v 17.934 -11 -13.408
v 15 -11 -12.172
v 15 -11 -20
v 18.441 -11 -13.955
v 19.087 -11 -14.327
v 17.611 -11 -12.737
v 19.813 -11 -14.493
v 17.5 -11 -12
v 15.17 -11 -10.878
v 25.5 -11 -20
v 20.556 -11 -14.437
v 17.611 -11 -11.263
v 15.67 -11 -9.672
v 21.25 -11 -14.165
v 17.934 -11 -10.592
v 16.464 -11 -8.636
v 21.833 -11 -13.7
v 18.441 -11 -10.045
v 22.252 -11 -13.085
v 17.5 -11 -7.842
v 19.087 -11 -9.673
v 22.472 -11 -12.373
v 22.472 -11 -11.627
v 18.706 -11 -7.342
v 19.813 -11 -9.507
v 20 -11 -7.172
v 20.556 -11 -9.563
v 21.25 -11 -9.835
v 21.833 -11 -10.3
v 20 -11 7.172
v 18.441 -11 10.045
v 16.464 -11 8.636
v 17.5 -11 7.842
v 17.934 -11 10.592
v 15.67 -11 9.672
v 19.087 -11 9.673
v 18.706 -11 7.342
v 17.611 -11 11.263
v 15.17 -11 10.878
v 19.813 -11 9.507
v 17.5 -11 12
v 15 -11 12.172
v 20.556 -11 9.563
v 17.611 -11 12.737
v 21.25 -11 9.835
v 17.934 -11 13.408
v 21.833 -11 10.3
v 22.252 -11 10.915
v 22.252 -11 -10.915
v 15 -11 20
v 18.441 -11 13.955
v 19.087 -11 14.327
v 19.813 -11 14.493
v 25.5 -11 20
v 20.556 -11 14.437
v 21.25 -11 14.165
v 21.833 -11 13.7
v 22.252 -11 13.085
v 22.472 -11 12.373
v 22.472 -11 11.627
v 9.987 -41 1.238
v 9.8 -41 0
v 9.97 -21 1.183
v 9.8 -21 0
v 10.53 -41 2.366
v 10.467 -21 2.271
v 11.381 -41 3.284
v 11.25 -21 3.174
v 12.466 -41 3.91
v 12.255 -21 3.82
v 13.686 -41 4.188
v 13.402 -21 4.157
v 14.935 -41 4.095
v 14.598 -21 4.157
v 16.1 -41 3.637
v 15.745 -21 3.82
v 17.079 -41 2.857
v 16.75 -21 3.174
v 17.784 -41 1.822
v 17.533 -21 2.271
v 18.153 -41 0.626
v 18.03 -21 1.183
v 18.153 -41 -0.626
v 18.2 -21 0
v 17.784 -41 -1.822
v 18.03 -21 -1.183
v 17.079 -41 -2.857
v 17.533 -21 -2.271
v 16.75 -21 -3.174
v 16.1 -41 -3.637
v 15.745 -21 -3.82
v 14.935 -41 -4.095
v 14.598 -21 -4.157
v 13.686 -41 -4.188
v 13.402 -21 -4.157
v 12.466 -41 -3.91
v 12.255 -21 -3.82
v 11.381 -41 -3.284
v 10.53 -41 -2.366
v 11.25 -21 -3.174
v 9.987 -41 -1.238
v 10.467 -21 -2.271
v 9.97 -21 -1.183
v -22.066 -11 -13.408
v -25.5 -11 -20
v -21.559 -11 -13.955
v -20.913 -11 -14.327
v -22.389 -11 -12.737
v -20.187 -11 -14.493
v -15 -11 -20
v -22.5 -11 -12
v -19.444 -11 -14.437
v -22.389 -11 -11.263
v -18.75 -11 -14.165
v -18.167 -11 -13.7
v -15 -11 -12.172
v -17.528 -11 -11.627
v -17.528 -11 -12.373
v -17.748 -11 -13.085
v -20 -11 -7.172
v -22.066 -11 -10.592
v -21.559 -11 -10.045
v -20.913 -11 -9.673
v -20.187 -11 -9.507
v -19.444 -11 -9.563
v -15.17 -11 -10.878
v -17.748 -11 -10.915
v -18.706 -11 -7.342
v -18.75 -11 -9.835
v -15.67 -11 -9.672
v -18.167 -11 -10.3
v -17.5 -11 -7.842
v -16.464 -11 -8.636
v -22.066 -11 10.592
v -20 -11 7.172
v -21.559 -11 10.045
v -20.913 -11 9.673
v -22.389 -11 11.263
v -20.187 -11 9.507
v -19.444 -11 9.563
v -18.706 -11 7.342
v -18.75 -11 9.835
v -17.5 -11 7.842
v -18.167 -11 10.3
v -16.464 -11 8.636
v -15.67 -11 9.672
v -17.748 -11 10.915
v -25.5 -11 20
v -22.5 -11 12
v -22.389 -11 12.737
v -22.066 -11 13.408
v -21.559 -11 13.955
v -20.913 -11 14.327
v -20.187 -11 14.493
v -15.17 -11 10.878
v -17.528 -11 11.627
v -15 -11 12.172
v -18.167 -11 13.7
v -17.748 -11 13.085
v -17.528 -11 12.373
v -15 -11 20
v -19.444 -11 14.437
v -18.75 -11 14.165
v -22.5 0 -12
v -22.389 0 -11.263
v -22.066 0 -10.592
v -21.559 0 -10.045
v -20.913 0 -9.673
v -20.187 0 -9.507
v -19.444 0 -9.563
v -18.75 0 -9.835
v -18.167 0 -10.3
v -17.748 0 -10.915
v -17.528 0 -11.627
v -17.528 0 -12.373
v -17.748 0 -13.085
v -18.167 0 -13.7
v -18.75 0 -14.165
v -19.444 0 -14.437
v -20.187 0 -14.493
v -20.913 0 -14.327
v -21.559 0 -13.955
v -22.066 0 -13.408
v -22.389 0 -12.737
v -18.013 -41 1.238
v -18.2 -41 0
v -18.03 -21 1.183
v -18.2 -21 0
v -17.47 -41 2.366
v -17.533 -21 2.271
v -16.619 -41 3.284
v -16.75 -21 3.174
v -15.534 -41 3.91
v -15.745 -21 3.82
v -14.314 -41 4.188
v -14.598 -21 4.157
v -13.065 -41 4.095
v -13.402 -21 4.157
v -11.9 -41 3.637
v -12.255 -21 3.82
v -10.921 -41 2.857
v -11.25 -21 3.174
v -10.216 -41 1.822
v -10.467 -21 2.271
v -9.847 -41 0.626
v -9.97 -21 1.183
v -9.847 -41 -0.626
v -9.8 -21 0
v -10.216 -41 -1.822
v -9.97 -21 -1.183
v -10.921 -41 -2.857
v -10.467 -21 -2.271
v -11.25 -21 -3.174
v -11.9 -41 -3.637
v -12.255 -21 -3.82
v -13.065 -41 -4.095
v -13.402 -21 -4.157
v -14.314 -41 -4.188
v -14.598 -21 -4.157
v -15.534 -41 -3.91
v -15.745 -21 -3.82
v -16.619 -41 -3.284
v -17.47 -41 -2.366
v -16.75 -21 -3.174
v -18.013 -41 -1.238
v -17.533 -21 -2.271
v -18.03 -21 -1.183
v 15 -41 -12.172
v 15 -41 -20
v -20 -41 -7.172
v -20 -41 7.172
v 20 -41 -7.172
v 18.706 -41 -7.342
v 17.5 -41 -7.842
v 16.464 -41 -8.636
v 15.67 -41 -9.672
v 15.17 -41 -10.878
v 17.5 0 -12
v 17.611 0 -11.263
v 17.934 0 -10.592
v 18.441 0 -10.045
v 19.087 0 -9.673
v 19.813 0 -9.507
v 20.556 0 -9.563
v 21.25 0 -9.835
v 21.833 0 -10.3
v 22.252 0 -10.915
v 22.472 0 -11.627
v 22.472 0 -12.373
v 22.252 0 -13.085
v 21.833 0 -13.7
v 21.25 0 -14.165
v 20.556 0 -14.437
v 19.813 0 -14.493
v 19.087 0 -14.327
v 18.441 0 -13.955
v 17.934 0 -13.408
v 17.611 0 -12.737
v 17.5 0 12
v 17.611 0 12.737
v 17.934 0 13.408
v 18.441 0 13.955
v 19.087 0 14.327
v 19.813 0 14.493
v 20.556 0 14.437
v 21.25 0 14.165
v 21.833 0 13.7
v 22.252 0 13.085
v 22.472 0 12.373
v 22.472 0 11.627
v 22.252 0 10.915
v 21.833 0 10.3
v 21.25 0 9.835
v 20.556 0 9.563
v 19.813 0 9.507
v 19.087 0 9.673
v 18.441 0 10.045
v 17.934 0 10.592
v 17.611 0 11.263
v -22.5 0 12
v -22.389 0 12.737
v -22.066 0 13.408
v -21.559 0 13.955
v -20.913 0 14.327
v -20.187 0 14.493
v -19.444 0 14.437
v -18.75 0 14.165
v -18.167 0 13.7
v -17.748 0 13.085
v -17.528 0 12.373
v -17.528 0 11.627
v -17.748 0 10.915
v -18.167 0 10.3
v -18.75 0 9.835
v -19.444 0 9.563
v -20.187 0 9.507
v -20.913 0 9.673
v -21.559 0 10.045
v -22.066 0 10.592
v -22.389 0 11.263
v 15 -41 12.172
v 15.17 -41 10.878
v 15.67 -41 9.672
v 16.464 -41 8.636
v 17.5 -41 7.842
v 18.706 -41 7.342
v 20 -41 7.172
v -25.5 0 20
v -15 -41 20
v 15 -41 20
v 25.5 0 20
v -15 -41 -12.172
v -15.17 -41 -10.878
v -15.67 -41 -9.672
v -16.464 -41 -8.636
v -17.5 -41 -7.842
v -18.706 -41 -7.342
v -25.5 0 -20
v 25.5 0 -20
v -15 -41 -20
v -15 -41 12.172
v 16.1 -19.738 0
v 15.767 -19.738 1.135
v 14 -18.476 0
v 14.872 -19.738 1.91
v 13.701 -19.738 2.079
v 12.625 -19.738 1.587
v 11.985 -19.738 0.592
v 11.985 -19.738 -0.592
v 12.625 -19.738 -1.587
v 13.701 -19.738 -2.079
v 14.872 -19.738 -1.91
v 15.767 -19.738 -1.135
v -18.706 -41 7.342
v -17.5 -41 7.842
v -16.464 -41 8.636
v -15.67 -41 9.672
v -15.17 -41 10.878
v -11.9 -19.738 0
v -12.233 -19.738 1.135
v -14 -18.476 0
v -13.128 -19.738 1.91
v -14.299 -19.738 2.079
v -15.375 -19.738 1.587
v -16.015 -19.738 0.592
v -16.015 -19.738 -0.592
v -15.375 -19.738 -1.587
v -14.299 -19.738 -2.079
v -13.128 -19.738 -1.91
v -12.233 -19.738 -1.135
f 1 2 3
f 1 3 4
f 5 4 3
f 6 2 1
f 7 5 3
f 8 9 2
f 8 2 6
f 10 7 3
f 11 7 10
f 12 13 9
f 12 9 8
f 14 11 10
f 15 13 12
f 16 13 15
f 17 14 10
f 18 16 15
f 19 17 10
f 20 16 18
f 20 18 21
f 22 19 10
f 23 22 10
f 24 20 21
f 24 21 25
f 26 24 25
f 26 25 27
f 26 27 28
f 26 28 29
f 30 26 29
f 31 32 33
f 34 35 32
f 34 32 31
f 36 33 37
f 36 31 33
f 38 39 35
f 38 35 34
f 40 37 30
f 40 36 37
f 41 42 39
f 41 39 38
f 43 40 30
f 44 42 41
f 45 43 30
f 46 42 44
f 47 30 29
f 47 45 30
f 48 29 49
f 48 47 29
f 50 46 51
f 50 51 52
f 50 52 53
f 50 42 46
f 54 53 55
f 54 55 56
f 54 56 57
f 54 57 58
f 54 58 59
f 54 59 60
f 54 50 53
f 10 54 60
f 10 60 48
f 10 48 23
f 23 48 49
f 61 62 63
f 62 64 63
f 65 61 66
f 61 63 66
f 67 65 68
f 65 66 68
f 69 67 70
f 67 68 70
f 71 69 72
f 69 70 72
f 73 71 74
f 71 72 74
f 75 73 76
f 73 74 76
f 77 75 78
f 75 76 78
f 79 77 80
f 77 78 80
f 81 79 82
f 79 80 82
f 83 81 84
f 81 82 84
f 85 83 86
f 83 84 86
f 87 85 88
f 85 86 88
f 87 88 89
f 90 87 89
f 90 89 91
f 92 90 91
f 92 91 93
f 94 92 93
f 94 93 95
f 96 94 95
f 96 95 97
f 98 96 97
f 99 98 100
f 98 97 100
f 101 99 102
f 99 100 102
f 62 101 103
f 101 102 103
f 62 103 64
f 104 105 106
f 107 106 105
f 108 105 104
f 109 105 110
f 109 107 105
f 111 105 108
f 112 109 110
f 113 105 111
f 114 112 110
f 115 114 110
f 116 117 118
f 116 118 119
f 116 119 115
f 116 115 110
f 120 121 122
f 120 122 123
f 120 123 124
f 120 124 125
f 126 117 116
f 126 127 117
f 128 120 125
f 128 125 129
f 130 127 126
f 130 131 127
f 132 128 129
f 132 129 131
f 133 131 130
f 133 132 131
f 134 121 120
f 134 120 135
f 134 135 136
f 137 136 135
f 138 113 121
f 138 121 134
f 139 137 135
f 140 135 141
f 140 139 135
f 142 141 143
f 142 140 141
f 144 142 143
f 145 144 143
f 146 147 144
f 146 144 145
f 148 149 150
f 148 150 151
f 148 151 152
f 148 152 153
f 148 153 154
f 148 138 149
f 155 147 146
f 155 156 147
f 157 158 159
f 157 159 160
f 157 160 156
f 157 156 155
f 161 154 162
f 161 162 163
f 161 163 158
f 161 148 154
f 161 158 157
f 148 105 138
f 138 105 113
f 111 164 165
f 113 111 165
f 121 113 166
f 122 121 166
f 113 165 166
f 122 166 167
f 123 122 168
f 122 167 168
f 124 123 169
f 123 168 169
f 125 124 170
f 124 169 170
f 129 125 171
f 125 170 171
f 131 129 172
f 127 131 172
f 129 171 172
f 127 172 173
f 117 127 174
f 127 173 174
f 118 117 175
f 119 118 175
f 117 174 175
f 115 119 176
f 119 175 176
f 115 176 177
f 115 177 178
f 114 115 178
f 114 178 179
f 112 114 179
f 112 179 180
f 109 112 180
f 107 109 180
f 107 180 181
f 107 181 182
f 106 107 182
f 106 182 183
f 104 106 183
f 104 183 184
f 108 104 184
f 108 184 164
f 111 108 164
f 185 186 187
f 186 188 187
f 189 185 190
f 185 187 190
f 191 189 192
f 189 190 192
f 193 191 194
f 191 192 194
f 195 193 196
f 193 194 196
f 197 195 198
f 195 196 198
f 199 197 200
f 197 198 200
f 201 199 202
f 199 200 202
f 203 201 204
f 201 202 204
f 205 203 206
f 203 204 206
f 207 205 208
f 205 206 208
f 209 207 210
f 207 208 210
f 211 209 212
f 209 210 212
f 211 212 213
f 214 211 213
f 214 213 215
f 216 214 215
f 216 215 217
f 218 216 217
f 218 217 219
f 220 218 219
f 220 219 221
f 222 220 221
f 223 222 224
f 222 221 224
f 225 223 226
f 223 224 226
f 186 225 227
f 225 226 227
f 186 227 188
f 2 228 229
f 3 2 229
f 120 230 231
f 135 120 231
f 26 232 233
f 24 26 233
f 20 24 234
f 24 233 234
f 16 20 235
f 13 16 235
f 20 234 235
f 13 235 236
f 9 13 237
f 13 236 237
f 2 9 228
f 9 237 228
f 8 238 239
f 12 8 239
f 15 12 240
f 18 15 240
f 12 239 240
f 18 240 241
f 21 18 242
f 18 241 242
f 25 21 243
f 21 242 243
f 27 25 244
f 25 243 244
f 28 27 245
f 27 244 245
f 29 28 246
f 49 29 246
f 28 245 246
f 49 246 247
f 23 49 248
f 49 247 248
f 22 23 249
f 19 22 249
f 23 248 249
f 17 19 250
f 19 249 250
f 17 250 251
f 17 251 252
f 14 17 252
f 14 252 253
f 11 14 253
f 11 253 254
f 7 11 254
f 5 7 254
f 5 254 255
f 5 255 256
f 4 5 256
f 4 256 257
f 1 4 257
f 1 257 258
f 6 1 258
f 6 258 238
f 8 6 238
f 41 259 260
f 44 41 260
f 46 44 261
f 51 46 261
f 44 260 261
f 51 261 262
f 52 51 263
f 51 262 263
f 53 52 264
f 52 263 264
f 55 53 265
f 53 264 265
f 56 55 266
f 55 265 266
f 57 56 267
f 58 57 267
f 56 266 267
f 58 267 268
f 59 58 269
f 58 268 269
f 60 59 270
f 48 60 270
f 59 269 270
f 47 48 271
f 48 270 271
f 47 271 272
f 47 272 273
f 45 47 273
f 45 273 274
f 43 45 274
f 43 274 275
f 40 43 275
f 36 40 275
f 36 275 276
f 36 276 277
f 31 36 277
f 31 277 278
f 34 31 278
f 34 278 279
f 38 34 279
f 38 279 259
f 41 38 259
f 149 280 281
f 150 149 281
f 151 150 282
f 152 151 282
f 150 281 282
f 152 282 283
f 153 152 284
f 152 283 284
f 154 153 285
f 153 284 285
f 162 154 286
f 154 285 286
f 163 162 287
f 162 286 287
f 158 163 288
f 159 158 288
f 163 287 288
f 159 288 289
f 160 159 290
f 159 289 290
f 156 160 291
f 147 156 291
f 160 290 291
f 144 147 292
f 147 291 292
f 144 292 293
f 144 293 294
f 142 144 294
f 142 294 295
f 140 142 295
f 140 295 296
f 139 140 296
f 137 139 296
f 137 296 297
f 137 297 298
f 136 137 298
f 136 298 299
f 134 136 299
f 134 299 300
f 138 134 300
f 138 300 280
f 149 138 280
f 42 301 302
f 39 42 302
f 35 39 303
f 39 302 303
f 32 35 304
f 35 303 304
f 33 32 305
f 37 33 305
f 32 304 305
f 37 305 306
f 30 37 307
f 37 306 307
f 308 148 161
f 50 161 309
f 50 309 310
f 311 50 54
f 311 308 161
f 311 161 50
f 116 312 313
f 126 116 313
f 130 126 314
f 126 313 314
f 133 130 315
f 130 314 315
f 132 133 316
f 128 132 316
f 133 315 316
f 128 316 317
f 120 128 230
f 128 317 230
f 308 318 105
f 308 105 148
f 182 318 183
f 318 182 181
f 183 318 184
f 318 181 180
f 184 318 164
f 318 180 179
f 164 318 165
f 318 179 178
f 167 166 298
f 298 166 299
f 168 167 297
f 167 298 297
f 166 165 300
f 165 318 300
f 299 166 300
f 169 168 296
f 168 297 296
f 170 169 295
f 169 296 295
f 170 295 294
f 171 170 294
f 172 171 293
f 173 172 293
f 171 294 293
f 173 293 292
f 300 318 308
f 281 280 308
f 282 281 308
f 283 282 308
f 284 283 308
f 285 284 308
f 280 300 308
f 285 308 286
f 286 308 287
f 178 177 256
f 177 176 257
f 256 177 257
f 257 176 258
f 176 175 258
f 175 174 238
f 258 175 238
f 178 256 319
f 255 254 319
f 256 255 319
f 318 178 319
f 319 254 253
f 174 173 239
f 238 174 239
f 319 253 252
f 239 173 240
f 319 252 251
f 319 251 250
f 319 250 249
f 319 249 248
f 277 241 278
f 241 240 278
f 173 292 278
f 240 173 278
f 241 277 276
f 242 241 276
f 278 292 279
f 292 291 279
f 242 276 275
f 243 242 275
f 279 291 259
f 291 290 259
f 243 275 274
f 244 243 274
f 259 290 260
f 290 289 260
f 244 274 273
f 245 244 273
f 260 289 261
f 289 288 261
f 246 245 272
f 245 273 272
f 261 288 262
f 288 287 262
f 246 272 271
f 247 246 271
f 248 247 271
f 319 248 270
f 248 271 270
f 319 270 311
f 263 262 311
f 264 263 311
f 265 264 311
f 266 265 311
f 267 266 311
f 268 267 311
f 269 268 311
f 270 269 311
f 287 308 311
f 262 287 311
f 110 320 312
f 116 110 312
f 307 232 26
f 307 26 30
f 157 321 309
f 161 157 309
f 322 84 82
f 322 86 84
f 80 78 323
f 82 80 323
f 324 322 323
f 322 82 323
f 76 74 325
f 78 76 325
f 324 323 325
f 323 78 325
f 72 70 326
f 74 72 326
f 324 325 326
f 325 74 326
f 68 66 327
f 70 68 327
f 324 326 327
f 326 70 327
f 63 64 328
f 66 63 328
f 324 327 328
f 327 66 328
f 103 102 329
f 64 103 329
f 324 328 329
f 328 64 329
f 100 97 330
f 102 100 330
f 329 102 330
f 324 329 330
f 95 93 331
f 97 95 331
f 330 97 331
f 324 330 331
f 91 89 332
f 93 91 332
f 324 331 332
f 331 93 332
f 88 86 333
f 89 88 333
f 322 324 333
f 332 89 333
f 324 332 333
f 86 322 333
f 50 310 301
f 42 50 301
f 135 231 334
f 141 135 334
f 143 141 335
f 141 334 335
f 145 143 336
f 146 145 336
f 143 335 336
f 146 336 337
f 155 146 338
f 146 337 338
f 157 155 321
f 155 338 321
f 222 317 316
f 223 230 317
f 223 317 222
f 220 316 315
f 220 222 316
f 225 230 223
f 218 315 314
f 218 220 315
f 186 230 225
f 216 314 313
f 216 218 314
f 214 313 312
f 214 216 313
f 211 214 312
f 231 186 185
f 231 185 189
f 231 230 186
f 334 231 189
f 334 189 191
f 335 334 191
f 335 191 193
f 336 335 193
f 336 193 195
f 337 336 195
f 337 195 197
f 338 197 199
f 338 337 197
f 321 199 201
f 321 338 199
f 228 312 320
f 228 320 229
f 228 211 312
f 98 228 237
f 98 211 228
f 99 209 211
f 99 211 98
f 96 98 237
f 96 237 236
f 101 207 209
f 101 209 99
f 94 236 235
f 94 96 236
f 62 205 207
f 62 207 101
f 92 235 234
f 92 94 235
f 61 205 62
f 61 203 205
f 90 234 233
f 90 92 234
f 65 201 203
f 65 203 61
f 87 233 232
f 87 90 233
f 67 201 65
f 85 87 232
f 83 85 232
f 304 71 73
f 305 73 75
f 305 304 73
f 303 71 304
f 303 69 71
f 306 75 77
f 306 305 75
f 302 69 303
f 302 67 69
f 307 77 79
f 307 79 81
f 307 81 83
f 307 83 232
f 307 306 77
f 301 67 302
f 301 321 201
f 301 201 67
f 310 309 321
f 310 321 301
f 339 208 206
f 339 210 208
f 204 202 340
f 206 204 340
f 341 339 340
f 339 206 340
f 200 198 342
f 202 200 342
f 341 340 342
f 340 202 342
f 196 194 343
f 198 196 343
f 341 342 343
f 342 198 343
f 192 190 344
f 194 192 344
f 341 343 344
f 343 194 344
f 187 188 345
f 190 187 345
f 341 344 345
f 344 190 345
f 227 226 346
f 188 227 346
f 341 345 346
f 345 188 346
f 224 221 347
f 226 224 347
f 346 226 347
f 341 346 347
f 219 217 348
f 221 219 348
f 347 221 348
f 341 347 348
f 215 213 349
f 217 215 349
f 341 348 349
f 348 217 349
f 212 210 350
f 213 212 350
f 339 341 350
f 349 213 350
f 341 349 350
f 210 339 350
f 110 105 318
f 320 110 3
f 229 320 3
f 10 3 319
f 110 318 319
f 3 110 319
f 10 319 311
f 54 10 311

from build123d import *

# Parameters (mm, degrees)
F0_W     = 51
F0_H     = 40
F1_DEPTH = 41
F4_W     = 5.5
F4_H     = 40
F5_DEPTH = 30
F7_DEPTH = 30
F2_R     = 2.5
F8_DEPTH = 41.001
F9_D     = 8.4
F9_DEPTH = 20
F9_TIP   = 2.5236145999


with BuildPart() as f1:
    # F0 (on Front) → F1 (new body)
    with BuildSketch(Plane.XZ):
        Rectangle(F0_W, F0_H)
    extrude(amount=F1_DEPTH)

    # F4 (on face) → F5 (cut)
    with BuildSketch(Plane.XZ.offset(41)):
        with Locations((22.75, 0)):
            Rectangle(F4_W, F4_H)
        with Locations((-22.75, 0)):
            Rectangle(F4_W, F4_H)
    extrude(amount=-F5_DEPTH, mode=Mode.SUBTRACT)

    # F6 (on face) → F7 (cut)
    with BuildSketch(Plane.XZ.offset(41)):
        with BuildLine():
            Line((-20, 20), (-20, 17.1716884745))
            ThreePointArc((-20, 17.1716884745), (-23.5355339059, 8.6361545685), (-15, 12.1716884745))
            Line((-15, 12.1716884745), (-15, 20))
            Line((-15, 20), (-20, 20))
        make_face()
        with BuildLine():
            Line((20, 17.1716884745), (20, 20))
            Line((20, 20), (15, 20))
            Line((15, 20), (15, 12.1716884745))
            ThreePointArc((15, 12.1716884745), (23.5355339059, 8.6361545685), (20, 17.1716884745))
        make_face()
        with BuildLine():
            Line((20, -20), (20, -17.1716884745))
            ThreePointArc((20, -17.1716884745), (23.5355339059, -8.6361545685), (15, -12.1716884745))
            Line((15, -12.1716884745), (15, -20))
            Line((15, -20), (20, -20))
        make_face()
        with BuildLine():
            ThreePointArc((-15, -12.1716884745), (-23.5355339059, -8.6361545685), (-20, -17.1716884745))
            Line((-20, -17.1716884745), (-20, -20))
            Line((-20, -20), (-15, -20))
            Line((-15, -20), (-15, -12.1716884745))
        make_face()
    extrude(amount=-F7_DEPTH, mode=Mode.SUBTRACT)

    # F2 (on face) → F8 (cut, through all)
    with BuildSketch(Plane(origin=(0, 0, 0), x_dir=(-1, 0, 0), z_dir=(0, 1, 0))):
        with Locations((-20, 12)):
            Circle(F2_R)
        with Locations((-20, -12)):
            Circle(F2_R)
        with Locations((20, -12)):
            Circle(F2_R)
        with Locations((20, 12)):
            Circle(F2_R)
    extrude(amount=-F8_DEPTH, mode=Mode.SUBTRACT)

    # F9
    with Locations(Plane.XZ.offset(41)):
        with Locations((-14, 0), (14, 0)):
            Hole(F9_D / 2, depth=F9_DEPTH)
            with Locations((0, 0, -(F9_DEPTH + F9_TIP / 2))):  # 118° drill point
                Cone(0, F9_D / 2, F9_TIP, mode=Mode.SUBTRACT)


solid = f1.part
